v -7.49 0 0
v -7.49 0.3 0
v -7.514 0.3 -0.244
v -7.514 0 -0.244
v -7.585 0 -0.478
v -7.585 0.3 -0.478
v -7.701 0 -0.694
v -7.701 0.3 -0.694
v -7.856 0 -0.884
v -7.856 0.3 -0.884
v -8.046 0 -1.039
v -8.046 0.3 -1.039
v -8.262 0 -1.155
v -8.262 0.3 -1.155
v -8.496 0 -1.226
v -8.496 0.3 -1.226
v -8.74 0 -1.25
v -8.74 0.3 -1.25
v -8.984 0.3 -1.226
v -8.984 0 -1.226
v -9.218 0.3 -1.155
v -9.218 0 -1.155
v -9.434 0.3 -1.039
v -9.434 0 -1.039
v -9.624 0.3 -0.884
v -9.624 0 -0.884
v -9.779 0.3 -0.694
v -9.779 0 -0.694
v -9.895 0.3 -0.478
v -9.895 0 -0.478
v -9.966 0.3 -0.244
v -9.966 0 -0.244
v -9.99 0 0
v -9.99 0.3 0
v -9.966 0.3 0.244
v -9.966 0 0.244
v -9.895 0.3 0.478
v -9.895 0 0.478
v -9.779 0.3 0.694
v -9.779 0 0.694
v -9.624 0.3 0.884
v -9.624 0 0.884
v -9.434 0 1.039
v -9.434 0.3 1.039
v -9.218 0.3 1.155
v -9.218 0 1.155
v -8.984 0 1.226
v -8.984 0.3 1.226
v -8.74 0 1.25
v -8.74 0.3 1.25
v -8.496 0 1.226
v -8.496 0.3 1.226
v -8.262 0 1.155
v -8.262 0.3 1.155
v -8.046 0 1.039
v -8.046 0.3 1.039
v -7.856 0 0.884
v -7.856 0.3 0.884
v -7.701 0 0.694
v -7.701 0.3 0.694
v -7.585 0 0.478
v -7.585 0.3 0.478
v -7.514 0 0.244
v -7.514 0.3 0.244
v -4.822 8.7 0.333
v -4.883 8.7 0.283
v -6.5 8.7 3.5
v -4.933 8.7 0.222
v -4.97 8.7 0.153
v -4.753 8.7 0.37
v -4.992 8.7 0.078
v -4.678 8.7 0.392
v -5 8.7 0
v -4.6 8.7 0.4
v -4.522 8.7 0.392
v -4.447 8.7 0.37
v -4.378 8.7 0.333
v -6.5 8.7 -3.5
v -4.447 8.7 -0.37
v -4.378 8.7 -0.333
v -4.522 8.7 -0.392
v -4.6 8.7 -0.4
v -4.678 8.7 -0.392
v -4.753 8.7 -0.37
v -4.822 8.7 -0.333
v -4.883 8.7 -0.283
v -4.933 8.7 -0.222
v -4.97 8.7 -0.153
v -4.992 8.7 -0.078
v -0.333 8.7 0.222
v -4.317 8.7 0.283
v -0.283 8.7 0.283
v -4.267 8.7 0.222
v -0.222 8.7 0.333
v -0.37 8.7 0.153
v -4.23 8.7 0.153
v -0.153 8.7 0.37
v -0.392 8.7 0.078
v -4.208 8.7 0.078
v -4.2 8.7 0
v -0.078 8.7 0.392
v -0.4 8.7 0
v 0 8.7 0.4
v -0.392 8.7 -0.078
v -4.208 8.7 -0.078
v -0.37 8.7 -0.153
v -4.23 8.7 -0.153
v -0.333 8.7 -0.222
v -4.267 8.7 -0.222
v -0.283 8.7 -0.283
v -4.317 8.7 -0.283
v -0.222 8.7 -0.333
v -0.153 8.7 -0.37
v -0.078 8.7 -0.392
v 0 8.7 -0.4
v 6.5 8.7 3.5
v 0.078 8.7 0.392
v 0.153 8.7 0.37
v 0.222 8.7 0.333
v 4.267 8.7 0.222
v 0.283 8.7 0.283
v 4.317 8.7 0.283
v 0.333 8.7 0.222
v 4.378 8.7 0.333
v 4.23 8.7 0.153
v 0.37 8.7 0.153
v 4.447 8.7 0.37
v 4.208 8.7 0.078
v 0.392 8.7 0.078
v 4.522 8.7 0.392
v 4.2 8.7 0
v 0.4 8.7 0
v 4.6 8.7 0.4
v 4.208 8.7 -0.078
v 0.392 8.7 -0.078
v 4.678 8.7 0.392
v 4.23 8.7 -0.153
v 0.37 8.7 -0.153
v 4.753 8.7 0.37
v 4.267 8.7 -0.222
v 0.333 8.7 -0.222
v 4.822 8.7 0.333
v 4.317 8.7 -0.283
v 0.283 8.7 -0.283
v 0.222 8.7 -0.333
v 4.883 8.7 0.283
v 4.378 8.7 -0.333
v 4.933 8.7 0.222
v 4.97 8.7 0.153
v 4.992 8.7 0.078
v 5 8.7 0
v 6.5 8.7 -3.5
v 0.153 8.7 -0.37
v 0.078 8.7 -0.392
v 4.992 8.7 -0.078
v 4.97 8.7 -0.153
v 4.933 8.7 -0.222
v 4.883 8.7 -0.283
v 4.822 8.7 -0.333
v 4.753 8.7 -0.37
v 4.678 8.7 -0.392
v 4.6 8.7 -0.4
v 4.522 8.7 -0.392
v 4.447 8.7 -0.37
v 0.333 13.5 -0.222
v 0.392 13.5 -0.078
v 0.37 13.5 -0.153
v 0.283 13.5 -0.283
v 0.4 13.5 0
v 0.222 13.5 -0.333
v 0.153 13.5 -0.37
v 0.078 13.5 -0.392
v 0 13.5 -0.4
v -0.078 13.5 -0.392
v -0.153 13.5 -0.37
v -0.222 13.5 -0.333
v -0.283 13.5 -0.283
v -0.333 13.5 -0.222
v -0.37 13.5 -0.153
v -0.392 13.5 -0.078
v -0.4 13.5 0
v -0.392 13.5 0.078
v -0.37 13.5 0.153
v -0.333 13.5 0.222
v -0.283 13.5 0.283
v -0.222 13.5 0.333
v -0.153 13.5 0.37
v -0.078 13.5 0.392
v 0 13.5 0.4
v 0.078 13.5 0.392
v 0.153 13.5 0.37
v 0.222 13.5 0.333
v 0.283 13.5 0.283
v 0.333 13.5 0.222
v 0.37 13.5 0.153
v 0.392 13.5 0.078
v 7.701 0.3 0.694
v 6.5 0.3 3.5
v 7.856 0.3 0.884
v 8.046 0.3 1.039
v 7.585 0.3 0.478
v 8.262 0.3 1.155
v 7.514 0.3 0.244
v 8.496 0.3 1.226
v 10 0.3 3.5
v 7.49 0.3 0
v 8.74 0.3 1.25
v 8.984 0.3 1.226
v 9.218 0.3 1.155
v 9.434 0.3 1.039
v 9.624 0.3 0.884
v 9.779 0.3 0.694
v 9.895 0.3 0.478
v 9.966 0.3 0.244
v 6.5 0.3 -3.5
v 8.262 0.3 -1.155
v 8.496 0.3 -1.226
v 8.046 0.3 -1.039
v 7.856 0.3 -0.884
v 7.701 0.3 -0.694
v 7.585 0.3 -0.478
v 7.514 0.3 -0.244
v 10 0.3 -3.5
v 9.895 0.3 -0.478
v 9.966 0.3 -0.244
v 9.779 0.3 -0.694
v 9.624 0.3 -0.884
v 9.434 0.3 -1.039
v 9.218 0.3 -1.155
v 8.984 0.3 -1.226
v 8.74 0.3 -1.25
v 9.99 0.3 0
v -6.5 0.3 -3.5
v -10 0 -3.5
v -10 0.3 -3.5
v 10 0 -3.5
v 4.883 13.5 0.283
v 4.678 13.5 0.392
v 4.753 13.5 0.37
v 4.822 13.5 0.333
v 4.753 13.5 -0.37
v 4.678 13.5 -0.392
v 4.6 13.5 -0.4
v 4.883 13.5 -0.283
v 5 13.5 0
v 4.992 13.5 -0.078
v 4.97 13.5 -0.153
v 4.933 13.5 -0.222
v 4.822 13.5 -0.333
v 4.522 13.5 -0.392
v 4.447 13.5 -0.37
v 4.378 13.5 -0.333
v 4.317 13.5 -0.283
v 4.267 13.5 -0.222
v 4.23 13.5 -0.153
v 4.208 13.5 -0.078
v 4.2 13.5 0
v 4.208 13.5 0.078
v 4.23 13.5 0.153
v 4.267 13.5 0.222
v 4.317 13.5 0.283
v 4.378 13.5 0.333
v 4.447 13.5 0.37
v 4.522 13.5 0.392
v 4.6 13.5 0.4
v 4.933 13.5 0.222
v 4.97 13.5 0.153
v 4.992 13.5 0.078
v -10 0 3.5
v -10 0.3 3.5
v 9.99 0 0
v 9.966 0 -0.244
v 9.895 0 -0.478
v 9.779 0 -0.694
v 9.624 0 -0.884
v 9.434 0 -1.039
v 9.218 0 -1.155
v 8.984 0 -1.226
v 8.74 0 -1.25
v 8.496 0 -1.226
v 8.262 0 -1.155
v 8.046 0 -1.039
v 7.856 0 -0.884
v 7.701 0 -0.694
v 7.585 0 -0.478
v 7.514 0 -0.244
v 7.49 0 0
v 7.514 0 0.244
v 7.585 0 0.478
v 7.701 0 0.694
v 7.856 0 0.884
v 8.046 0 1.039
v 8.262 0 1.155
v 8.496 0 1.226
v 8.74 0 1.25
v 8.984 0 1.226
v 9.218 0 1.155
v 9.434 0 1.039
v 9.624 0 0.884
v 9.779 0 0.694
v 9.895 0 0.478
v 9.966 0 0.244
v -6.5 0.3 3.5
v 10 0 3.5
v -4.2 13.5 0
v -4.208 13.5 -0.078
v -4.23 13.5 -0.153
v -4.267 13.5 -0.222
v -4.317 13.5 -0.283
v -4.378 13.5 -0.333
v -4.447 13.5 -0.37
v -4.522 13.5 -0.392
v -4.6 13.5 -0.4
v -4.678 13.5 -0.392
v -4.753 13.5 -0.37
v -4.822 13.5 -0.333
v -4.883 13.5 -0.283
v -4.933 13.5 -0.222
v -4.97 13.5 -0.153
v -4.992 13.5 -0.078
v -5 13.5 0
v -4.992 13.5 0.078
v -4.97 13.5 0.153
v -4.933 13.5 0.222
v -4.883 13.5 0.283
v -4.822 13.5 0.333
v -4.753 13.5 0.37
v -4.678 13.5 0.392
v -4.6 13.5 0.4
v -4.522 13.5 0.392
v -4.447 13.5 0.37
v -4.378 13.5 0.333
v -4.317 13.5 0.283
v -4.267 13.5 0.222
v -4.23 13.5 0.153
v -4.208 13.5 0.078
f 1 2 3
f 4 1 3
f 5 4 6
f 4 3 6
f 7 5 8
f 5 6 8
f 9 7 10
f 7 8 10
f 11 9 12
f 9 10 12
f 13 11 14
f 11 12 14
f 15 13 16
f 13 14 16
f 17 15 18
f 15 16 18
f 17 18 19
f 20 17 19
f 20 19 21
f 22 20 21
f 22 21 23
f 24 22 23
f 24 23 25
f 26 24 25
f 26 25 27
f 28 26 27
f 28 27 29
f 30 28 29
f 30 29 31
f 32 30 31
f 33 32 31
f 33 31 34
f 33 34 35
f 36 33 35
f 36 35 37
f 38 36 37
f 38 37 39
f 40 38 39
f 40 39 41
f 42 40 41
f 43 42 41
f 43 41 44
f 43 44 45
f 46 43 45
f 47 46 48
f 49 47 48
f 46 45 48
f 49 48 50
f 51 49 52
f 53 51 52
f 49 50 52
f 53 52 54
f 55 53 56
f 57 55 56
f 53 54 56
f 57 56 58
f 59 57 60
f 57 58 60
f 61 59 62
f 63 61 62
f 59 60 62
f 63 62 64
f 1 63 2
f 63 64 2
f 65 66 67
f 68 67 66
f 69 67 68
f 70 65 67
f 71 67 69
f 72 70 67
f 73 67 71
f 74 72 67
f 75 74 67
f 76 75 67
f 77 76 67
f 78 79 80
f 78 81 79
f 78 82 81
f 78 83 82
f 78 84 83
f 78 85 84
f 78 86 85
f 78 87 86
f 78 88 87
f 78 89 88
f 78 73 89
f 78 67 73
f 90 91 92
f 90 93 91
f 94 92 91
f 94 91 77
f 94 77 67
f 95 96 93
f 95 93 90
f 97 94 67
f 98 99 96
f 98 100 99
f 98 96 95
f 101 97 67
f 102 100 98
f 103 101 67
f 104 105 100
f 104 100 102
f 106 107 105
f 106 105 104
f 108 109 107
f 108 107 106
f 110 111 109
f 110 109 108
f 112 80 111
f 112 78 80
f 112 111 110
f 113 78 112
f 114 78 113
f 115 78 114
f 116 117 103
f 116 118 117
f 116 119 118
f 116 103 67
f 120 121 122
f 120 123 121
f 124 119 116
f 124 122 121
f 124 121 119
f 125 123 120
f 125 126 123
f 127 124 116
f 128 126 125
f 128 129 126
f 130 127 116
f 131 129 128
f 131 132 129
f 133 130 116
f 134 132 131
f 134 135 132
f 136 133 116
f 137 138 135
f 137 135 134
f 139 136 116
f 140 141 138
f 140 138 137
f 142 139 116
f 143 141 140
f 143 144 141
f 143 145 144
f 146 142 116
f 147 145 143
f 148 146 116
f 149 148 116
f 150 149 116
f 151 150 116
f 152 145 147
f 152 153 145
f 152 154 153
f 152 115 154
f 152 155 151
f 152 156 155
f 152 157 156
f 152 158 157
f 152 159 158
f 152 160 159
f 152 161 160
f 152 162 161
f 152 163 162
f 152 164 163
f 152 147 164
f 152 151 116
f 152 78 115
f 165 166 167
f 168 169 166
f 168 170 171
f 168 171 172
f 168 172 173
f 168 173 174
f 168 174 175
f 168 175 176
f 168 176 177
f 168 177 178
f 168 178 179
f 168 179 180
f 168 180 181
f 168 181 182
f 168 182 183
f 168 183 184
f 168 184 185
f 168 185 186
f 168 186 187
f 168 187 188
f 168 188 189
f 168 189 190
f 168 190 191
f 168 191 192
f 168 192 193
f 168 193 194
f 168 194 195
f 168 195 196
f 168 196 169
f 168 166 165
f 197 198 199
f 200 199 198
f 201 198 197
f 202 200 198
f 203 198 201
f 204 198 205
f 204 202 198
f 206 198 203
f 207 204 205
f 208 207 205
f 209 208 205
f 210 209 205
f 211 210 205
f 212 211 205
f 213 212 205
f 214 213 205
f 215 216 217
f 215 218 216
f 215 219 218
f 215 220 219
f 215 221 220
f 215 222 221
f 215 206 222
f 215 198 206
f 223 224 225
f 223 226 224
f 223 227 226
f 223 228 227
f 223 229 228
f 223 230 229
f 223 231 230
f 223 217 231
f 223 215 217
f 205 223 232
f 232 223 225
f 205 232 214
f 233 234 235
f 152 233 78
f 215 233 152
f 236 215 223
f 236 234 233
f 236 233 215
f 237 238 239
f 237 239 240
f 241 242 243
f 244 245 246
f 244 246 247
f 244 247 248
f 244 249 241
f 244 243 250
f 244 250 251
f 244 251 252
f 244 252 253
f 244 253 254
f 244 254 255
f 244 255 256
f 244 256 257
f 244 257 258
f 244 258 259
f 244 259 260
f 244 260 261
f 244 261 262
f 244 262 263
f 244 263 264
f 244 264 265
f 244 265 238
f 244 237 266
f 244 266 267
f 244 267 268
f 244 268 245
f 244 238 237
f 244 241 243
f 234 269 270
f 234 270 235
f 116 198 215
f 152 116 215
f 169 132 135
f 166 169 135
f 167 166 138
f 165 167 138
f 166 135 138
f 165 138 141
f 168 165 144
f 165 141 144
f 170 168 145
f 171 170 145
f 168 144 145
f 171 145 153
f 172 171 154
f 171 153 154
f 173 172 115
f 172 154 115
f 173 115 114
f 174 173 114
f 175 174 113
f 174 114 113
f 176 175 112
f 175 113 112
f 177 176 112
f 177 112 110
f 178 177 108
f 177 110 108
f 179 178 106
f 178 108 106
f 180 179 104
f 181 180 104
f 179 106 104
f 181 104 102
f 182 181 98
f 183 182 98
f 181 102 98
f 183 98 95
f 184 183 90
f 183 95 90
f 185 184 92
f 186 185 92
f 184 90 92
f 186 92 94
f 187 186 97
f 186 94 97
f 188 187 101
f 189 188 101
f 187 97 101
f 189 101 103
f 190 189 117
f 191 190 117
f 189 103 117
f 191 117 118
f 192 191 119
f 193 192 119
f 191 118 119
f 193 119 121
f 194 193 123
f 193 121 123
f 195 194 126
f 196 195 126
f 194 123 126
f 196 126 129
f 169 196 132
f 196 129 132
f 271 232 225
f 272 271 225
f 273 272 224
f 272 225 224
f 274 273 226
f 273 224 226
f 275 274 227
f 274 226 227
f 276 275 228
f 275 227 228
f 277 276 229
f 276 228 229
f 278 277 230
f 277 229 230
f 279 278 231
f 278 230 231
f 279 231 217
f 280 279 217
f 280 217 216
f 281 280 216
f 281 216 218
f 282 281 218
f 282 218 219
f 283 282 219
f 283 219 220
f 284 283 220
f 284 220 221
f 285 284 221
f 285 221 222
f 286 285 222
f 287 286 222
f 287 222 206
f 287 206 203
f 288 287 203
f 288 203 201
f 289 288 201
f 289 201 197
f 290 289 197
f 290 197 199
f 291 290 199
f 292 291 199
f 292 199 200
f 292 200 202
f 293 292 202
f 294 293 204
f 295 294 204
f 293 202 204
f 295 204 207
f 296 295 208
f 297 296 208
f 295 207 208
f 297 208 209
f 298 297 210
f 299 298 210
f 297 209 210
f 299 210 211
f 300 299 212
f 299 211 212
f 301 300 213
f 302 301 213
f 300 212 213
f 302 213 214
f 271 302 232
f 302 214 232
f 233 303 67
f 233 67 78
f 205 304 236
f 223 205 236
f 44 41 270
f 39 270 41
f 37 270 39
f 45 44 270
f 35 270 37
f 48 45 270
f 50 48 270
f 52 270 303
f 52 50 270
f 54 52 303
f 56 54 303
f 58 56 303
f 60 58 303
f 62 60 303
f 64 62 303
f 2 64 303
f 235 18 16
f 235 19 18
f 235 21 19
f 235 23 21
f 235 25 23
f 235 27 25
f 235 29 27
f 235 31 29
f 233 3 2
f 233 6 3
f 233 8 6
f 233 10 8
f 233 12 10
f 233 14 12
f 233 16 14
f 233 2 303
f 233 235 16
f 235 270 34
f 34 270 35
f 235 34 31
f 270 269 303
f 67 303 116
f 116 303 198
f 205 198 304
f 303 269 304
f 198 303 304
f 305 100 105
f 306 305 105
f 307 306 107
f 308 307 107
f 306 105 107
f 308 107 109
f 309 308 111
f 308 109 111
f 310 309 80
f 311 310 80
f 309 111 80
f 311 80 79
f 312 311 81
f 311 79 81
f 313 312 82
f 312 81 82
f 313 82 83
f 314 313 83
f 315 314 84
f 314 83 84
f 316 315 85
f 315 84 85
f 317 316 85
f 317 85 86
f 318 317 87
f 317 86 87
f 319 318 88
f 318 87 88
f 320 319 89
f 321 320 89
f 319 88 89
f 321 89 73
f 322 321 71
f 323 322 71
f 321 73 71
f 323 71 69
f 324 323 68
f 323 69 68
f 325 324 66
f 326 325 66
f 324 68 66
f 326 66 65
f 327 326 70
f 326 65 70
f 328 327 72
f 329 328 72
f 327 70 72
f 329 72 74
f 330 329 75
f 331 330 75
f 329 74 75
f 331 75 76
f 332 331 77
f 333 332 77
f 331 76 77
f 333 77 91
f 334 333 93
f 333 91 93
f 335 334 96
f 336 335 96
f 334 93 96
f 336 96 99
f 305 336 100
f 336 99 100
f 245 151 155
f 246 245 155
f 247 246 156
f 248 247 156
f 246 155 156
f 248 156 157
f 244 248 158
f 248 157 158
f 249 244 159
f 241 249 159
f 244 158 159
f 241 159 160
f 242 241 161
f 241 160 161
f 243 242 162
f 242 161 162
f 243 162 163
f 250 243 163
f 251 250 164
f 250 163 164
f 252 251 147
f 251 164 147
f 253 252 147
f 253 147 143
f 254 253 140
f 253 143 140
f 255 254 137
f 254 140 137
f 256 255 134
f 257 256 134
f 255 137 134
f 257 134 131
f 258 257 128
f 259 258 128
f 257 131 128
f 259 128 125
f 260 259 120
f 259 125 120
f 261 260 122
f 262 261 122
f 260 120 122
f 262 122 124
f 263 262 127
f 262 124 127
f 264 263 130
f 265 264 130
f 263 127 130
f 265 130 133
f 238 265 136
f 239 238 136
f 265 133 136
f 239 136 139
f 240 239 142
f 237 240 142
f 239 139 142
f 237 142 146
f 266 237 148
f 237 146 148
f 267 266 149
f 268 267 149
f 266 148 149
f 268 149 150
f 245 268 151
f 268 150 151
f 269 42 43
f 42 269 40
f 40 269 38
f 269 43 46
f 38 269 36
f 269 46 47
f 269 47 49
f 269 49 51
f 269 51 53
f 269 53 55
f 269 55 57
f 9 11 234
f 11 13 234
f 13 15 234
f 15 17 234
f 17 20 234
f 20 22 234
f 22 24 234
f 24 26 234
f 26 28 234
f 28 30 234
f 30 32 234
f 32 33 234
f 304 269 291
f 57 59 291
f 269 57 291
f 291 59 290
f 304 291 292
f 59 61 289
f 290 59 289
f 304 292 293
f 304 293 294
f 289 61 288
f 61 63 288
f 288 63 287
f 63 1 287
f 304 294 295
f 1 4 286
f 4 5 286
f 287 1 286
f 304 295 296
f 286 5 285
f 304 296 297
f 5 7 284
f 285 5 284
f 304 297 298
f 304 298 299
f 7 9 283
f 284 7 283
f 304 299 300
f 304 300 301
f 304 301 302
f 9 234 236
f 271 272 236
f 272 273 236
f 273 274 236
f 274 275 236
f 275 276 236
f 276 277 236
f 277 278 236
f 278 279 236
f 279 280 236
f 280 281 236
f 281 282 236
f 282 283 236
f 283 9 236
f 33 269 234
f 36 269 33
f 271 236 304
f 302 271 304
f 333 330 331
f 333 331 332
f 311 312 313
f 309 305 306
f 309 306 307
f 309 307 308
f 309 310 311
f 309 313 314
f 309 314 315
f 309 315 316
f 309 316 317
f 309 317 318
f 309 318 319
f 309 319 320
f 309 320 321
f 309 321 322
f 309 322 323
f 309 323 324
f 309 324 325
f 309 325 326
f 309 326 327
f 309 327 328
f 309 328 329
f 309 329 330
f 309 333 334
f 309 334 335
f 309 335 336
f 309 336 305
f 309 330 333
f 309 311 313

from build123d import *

# Parameters (mm, degrees)
SKETCH1_W           = 20
SKETCH1_H           = 7
BOSS_EXTRUDE1_DEPTH = 0.3
SKETCH2_W           = 13
SKETCH2_H           = 7
BOSS_EXTRUDE2_DEPTH = 8.4
CUT_EXTRUDE5_REACH  = 2.3
SKETCH3_R           = 1.25
SKETCH4_R           = 0.4
BOSS_EXTRUDE3_DEPTH = 4.8


with BuildPart() as part:
    # Sketch1 → Boss-Extrude1 (new body)
    with BuildSketch(Plane(origin=(0, 0, 0), x_dir=(1, 0, 0), z_dir=(0, 1, 0))):
        Rectangle(SKETCH1_W, SKETCH1_H)
    extrude(amount=BOSS_EXTRUDE1_DEPTH)

    # Sketch2 → Boss-Extrude2 (add)
    with BuildSketch(Plane(origin=(0, 0.3, 0), x_dir=(1, 0, 0), z_dir=(0, 1, 0))):
        Rectangle(SKETCH2_W, SKETCH2_H)
    extrude(amount=BOSS_EXTRUDE2_DEPTH)

    # Sketch3 → Cut-Extrude5 (cut, up to next)
    with BuildSketch(Plane(origin=(0, 0.3, 0), x_dir=(1, 0, 0), z_dir=(0, 1, 0)), mode=Mode.PRIVATE) as cut_extrude5_sk1:
        with Locations((-8.74, 0)):
            Circle(SKETCH3_R)
    cut_extrude5_tool1 = extrude(cut_extrude5_sk1.sketch, amount=-CUT_EXTRUDE5_REACH, mode=Mode.PRIVATE) & part.part
    add(cut_extrude5_tool1.solids().sort_by_distance((-8.74, 0.3, 0))[0], mode=Mode.SUBTRACT)
    # Sketch3 → Cut-Extrude5 (cut, up to next)
    with BuildSketch(Plane(origin=(0, 0.3, 0), x_dir=(1, 0, 0), z_dir=(0, 1, 0)), mode=Mode.PRIVATE) as cut_extrude5_sk2:
        with Locations((8.74, 0)):
            Circle(SKETCH3_R)
    cut_extrude5_tool2 = extrude(cut_extrude5_sk2.sketch, amount=-CUT_EXTRUDE5_REACH, mode=Mode.PRIVATE) & part.part
    add(cut_extrude5_tool2.solids().sort_by_distance((8.74, 0.3, 0))[0], mode=Mode.SUBTRACT)

    # Sketch4 → Boss-Extrude3 (add)
    with BuildSketch(Plane(origin=(0, 8.7, 0), x_dir=(1, 0, 0), z_dir=(0, 1, 0))):
        with Locations((-4.6, 0)):
            Circle(SKETCH4_R)
        Circle(SKETCH4_R)
        with Locations((4.6, 0)):
            Circle(SKETCH4_R)
    extrude(amount=BOSS_EXTRUDE3_DEPTH)


solid = part.part
